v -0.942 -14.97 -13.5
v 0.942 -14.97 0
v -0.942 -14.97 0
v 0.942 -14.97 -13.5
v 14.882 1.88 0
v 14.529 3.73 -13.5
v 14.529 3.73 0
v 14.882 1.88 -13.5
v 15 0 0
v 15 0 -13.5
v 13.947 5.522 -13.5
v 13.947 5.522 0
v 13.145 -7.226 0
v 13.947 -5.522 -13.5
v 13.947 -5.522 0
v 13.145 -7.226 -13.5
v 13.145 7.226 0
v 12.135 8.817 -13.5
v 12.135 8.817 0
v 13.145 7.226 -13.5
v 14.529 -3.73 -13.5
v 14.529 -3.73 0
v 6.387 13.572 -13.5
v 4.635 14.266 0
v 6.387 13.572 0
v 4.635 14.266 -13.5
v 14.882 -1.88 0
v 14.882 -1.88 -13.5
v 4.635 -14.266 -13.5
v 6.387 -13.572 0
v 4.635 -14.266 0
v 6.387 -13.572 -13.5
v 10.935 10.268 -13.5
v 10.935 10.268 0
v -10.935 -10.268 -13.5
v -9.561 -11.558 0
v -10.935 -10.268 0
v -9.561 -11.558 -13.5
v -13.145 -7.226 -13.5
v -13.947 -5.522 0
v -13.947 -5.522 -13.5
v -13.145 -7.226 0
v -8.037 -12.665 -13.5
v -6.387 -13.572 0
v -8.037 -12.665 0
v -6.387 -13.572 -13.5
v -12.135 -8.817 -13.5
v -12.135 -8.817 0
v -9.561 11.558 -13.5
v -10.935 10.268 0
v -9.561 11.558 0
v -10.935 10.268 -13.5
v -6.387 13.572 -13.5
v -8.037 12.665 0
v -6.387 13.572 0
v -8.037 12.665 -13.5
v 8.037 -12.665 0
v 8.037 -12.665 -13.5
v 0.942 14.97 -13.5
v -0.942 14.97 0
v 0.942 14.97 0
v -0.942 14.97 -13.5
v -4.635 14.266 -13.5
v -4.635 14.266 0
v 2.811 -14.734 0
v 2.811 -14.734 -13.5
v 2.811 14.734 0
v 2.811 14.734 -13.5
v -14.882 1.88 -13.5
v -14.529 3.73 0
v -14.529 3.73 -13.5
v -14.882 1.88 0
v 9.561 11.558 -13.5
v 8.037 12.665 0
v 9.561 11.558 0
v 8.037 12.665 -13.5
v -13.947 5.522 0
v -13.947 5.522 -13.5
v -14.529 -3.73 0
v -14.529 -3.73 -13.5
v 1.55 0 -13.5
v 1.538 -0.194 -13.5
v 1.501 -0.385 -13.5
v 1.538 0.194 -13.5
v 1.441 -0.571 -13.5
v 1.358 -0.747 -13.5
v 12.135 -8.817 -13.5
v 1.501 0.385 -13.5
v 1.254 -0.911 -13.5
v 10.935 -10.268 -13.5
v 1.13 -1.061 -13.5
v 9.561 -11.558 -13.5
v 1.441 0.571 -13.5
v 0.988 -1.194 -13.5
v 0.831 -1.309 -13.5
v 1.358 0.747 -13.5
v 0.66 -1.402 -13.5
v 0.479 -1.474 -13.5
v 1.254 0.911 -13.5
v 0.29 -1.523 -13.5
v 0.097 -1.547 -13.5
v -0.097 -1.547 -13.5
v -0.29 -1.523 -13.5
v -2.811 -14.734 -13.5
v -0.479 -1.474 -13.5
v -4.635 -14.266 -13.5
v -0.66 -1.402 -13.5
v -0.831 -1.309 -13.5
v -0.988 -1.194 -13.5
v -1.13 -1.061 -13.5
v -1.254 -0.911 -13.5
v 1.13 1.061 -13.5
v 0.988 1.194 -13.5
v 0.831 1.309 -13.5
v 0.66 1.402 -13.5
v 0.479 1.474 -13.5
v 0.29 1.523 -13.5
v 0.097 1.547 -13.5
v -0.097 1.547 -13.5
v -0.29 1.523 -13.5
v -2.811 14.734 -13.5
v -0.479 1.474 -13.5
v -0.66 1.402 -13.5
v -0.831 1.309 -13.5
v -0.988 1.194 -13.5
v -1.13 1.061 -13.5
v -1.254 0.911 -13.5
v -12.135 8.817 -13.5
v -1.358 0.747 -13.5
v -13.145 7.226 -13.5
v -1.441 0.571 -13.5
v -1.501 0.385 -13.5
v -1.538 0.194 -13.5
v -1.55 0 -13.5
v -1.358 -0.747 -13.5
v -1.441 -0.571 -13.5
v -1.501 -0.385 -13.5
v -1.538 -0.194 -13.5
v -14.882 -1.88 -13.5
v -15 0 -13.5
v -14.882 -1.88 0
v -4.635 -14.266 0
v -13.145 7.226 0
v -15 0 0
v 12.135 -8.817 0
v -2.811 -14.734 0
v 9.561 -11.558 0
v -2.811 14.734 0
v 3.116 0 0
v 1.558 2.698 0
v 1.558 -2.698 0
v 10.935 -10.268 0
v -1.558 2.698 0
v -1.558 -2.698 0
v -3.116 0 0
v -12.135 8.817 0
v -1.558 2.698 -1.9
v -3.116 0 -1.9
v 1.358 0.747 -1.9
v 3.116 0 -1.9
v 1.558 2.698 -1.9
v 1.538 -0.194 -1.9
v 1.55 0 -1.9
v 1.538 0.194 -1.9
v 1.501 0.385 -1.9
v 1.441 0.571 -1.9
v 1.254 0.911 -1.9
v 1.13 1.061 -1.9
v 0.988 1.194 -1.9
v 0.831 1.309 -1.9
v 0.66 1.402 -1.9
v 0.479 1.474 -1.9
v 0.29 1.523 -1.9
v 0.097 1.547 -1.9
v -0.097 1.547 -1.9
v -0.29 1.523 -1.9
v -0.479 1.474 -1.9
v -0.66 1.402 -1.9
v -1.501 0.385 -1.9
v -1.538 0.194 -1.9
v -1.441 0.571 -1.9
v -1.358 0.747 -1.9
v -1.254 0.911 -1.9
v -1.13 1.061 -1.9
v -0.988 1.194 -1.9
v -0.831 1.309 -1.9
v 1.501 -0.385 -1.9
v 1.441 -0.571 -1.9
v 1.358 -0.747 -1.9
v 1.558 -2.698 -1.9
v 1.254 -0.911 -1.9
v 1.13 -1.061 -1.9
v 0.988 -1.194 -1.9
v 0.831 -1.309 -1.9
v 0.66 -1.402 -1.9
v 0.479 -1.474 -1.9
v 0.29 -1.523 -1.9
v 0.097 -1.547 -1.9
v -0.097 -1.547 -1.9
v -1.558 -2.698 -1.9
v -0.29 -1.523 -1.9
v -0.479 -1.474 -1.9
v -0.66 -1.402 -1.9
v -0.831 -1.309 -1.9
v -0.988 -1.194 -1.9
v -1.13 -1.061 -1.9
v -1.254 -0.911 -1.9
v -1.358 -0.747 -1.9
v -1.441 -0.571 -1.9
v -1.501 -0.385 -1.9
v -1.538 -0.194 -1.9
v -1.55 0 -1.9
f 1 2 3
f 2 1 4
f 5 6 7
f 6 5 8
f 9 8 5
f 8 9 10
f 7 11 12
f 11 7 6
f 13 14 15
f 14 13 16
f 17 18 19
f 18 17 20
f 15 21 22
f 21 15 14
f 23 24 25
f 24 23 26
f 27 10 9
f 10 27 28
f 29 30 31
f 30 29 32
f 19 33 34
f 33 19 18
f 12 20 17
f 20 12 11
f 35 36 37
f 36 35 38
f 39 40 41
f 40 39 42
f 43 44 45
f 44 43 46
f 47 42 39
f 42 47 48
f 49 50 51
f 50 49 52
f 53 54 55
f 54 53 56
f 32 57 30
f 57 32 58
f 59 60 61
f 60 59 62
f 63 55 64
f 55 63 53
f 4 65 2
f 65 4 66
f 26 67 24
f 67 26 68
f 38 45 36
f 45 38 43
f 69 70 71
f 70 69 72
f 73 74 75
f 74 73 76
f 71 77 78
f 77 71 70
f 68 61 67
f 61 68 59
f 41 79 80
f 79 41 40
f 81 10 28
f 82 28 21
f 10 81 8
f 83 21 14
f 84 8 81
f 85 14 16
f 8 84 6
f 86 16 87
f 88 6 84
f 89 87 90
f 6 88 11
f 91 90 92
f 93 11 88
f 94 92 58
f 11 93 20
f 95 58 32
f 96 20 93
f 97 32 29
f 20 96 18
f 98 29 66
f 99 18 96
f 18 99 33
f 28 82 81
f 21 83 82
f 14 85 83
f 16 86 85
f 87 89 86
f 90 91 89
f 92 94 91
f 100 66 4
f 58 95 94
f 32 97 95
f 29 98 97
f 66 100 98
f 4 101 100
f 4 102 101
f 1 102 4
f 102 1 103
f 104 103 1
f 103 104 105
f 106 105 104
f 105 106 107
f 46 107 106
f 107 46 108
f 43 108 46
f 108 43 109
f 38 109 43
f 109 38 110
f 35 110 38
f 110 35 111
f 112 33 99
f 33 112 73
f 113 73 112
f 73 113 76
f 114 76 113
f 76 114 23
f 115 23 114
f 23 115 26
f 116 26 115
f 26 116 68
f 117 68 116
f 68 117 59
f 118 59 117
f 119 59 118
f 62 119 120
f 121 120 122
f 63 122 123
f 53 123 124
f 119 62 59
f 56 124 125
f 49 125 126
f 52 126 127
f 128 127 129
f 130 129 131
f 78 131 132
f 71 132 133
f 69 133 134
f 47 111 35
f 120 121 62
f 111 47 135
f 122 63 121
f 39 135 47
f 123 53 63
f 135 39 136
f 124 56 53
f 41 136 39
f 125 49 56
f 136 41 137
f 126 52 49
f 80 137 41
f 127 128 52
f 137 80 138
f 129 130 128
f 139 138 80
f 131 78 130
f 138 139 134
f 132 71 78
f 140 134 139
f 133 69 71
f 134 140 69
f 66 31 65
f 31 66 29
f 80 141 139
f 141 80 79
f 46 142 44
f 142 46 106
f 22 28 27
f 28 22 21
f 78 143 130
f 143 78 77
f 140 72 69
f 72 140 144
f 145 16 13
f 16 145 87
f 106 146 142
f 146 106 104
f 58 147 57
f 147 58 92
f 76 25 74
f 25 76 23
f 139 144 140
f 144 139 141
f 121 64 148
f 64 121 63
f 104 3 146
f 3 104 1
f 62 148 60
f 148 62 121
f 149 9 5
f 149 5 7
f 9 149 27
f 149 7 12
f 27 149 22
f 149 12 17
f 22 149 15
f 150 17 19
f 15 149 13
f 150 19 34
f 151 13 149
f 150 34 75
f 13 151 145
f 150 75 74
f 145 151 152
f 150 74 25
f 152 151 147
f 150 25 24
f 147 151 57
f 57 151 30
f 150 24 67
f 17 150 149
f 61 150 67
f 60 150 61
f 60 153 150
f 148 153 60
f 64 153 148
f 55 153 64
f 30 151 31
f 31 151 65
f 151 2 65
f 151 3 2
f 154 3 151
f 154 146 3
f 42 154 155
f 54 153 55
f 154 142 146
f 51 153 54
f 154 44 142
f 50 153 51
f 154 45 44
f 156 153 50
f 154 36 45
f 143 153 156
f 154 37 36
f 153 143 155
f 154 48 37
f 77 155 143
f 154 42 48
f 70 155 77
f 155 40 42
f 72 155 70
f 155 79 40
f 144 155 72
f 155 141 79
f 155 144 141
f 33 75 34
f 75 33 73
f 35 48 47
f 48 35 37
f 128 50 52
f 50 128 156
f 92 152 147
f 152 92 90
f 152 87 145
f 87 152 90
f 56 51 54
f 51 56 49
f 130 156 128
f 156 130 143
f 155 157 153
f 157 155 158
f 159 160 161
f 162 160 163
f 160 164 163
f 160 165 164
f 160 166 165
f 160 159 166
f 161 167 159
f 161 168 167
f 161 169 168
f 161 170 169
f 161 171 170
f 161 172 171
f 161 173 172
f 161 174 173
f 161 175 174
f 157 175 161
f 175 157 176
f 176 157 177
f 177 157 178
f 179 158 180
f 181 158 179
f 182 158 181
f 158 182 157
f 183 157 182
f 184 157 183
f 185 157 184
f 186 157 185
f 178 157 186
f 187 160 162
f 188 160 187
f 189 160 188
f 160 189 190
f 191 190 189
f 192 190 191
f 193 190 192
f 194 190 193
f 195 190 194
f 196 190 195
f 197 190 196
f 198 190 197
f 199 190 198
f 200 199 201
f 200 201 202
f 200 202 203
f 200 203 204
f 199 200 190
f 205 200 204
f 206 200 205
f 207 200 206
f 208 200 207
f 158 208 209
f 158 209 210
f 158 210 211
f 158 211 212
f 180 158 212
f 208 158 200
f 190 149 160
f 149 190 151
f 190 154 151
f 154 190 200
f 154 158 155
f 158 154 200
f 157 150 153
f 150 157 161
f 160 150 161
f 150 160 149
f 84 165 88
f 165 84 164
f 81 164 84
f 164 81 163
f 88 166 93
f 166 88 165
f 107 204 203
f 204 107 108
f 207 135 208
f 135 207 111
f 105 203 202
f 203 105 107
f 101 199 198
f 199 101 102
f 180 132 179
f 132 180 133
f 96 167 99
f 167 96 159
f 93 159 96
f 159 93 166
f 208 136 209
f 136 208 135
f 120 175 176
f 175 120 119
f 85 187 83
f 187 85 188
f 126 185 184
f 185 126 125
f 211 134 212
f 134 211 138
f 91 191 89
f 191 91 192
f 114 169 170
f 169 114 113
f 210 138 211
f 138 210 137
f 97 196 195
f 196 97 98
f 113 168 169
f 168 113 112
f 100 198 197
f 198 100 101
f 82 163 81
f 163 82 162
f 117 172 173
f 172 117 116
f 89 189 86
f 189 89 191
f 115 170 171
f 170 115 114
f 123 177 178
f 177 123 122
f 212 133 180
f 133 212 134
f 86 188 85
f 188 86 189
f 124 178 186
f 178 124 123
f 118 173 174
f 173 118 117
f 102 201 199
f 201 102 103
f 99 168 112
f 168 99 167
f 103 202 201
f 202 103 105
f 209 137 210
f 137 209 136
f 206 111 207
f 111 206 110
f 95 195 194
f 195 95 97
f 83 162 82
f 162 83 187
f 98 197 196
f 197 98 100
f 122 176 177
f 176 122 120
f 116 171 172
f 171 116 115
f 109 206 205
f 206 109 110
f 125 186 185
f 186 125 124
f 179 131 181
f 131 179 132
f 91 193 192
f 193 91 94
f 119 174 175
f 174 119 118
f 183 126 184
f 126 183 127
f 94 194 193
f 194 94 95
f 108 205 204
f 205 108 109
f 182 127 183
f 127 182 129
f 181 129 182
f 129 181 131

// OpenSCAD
$fn = 50;


difference() {
	union() {
		translate(v = [0, 0, -13.5000000000]) {
			cylinder(h = 13.5000000000, r = 15.0000000000);
		}
		translate(v = [0, 0, -12.0000000000]) {
			cylinder(h = 12, r = 2.8750000000);
		}
	}
	union() {
		translate(v = [0, 0, 0]) {
			rotate(a = [0, 0, 0]) {
				difference() {
					union() {
						translate(v = [0, 0, -1.9000000000]) {
							linear_extrude(height = 1.9000000000) {
								polygon(points = [[3.1158000000, 0.0000000000], [1.5579000000, 2.6983619531], [-1.5579000000, 2.6983619531], [-3.1158000000, 0.0000000000], [-1.5579000000, -2.6983619531], [1.5579000000, -2.6983619531]]);
							}
						}
					}
					union();
				}
			}
		}
		#translate(v = [0, 0, -100.0000000000]) {
			cylinder(h = 200, r = 1.5500000000);
		}
	}
}
